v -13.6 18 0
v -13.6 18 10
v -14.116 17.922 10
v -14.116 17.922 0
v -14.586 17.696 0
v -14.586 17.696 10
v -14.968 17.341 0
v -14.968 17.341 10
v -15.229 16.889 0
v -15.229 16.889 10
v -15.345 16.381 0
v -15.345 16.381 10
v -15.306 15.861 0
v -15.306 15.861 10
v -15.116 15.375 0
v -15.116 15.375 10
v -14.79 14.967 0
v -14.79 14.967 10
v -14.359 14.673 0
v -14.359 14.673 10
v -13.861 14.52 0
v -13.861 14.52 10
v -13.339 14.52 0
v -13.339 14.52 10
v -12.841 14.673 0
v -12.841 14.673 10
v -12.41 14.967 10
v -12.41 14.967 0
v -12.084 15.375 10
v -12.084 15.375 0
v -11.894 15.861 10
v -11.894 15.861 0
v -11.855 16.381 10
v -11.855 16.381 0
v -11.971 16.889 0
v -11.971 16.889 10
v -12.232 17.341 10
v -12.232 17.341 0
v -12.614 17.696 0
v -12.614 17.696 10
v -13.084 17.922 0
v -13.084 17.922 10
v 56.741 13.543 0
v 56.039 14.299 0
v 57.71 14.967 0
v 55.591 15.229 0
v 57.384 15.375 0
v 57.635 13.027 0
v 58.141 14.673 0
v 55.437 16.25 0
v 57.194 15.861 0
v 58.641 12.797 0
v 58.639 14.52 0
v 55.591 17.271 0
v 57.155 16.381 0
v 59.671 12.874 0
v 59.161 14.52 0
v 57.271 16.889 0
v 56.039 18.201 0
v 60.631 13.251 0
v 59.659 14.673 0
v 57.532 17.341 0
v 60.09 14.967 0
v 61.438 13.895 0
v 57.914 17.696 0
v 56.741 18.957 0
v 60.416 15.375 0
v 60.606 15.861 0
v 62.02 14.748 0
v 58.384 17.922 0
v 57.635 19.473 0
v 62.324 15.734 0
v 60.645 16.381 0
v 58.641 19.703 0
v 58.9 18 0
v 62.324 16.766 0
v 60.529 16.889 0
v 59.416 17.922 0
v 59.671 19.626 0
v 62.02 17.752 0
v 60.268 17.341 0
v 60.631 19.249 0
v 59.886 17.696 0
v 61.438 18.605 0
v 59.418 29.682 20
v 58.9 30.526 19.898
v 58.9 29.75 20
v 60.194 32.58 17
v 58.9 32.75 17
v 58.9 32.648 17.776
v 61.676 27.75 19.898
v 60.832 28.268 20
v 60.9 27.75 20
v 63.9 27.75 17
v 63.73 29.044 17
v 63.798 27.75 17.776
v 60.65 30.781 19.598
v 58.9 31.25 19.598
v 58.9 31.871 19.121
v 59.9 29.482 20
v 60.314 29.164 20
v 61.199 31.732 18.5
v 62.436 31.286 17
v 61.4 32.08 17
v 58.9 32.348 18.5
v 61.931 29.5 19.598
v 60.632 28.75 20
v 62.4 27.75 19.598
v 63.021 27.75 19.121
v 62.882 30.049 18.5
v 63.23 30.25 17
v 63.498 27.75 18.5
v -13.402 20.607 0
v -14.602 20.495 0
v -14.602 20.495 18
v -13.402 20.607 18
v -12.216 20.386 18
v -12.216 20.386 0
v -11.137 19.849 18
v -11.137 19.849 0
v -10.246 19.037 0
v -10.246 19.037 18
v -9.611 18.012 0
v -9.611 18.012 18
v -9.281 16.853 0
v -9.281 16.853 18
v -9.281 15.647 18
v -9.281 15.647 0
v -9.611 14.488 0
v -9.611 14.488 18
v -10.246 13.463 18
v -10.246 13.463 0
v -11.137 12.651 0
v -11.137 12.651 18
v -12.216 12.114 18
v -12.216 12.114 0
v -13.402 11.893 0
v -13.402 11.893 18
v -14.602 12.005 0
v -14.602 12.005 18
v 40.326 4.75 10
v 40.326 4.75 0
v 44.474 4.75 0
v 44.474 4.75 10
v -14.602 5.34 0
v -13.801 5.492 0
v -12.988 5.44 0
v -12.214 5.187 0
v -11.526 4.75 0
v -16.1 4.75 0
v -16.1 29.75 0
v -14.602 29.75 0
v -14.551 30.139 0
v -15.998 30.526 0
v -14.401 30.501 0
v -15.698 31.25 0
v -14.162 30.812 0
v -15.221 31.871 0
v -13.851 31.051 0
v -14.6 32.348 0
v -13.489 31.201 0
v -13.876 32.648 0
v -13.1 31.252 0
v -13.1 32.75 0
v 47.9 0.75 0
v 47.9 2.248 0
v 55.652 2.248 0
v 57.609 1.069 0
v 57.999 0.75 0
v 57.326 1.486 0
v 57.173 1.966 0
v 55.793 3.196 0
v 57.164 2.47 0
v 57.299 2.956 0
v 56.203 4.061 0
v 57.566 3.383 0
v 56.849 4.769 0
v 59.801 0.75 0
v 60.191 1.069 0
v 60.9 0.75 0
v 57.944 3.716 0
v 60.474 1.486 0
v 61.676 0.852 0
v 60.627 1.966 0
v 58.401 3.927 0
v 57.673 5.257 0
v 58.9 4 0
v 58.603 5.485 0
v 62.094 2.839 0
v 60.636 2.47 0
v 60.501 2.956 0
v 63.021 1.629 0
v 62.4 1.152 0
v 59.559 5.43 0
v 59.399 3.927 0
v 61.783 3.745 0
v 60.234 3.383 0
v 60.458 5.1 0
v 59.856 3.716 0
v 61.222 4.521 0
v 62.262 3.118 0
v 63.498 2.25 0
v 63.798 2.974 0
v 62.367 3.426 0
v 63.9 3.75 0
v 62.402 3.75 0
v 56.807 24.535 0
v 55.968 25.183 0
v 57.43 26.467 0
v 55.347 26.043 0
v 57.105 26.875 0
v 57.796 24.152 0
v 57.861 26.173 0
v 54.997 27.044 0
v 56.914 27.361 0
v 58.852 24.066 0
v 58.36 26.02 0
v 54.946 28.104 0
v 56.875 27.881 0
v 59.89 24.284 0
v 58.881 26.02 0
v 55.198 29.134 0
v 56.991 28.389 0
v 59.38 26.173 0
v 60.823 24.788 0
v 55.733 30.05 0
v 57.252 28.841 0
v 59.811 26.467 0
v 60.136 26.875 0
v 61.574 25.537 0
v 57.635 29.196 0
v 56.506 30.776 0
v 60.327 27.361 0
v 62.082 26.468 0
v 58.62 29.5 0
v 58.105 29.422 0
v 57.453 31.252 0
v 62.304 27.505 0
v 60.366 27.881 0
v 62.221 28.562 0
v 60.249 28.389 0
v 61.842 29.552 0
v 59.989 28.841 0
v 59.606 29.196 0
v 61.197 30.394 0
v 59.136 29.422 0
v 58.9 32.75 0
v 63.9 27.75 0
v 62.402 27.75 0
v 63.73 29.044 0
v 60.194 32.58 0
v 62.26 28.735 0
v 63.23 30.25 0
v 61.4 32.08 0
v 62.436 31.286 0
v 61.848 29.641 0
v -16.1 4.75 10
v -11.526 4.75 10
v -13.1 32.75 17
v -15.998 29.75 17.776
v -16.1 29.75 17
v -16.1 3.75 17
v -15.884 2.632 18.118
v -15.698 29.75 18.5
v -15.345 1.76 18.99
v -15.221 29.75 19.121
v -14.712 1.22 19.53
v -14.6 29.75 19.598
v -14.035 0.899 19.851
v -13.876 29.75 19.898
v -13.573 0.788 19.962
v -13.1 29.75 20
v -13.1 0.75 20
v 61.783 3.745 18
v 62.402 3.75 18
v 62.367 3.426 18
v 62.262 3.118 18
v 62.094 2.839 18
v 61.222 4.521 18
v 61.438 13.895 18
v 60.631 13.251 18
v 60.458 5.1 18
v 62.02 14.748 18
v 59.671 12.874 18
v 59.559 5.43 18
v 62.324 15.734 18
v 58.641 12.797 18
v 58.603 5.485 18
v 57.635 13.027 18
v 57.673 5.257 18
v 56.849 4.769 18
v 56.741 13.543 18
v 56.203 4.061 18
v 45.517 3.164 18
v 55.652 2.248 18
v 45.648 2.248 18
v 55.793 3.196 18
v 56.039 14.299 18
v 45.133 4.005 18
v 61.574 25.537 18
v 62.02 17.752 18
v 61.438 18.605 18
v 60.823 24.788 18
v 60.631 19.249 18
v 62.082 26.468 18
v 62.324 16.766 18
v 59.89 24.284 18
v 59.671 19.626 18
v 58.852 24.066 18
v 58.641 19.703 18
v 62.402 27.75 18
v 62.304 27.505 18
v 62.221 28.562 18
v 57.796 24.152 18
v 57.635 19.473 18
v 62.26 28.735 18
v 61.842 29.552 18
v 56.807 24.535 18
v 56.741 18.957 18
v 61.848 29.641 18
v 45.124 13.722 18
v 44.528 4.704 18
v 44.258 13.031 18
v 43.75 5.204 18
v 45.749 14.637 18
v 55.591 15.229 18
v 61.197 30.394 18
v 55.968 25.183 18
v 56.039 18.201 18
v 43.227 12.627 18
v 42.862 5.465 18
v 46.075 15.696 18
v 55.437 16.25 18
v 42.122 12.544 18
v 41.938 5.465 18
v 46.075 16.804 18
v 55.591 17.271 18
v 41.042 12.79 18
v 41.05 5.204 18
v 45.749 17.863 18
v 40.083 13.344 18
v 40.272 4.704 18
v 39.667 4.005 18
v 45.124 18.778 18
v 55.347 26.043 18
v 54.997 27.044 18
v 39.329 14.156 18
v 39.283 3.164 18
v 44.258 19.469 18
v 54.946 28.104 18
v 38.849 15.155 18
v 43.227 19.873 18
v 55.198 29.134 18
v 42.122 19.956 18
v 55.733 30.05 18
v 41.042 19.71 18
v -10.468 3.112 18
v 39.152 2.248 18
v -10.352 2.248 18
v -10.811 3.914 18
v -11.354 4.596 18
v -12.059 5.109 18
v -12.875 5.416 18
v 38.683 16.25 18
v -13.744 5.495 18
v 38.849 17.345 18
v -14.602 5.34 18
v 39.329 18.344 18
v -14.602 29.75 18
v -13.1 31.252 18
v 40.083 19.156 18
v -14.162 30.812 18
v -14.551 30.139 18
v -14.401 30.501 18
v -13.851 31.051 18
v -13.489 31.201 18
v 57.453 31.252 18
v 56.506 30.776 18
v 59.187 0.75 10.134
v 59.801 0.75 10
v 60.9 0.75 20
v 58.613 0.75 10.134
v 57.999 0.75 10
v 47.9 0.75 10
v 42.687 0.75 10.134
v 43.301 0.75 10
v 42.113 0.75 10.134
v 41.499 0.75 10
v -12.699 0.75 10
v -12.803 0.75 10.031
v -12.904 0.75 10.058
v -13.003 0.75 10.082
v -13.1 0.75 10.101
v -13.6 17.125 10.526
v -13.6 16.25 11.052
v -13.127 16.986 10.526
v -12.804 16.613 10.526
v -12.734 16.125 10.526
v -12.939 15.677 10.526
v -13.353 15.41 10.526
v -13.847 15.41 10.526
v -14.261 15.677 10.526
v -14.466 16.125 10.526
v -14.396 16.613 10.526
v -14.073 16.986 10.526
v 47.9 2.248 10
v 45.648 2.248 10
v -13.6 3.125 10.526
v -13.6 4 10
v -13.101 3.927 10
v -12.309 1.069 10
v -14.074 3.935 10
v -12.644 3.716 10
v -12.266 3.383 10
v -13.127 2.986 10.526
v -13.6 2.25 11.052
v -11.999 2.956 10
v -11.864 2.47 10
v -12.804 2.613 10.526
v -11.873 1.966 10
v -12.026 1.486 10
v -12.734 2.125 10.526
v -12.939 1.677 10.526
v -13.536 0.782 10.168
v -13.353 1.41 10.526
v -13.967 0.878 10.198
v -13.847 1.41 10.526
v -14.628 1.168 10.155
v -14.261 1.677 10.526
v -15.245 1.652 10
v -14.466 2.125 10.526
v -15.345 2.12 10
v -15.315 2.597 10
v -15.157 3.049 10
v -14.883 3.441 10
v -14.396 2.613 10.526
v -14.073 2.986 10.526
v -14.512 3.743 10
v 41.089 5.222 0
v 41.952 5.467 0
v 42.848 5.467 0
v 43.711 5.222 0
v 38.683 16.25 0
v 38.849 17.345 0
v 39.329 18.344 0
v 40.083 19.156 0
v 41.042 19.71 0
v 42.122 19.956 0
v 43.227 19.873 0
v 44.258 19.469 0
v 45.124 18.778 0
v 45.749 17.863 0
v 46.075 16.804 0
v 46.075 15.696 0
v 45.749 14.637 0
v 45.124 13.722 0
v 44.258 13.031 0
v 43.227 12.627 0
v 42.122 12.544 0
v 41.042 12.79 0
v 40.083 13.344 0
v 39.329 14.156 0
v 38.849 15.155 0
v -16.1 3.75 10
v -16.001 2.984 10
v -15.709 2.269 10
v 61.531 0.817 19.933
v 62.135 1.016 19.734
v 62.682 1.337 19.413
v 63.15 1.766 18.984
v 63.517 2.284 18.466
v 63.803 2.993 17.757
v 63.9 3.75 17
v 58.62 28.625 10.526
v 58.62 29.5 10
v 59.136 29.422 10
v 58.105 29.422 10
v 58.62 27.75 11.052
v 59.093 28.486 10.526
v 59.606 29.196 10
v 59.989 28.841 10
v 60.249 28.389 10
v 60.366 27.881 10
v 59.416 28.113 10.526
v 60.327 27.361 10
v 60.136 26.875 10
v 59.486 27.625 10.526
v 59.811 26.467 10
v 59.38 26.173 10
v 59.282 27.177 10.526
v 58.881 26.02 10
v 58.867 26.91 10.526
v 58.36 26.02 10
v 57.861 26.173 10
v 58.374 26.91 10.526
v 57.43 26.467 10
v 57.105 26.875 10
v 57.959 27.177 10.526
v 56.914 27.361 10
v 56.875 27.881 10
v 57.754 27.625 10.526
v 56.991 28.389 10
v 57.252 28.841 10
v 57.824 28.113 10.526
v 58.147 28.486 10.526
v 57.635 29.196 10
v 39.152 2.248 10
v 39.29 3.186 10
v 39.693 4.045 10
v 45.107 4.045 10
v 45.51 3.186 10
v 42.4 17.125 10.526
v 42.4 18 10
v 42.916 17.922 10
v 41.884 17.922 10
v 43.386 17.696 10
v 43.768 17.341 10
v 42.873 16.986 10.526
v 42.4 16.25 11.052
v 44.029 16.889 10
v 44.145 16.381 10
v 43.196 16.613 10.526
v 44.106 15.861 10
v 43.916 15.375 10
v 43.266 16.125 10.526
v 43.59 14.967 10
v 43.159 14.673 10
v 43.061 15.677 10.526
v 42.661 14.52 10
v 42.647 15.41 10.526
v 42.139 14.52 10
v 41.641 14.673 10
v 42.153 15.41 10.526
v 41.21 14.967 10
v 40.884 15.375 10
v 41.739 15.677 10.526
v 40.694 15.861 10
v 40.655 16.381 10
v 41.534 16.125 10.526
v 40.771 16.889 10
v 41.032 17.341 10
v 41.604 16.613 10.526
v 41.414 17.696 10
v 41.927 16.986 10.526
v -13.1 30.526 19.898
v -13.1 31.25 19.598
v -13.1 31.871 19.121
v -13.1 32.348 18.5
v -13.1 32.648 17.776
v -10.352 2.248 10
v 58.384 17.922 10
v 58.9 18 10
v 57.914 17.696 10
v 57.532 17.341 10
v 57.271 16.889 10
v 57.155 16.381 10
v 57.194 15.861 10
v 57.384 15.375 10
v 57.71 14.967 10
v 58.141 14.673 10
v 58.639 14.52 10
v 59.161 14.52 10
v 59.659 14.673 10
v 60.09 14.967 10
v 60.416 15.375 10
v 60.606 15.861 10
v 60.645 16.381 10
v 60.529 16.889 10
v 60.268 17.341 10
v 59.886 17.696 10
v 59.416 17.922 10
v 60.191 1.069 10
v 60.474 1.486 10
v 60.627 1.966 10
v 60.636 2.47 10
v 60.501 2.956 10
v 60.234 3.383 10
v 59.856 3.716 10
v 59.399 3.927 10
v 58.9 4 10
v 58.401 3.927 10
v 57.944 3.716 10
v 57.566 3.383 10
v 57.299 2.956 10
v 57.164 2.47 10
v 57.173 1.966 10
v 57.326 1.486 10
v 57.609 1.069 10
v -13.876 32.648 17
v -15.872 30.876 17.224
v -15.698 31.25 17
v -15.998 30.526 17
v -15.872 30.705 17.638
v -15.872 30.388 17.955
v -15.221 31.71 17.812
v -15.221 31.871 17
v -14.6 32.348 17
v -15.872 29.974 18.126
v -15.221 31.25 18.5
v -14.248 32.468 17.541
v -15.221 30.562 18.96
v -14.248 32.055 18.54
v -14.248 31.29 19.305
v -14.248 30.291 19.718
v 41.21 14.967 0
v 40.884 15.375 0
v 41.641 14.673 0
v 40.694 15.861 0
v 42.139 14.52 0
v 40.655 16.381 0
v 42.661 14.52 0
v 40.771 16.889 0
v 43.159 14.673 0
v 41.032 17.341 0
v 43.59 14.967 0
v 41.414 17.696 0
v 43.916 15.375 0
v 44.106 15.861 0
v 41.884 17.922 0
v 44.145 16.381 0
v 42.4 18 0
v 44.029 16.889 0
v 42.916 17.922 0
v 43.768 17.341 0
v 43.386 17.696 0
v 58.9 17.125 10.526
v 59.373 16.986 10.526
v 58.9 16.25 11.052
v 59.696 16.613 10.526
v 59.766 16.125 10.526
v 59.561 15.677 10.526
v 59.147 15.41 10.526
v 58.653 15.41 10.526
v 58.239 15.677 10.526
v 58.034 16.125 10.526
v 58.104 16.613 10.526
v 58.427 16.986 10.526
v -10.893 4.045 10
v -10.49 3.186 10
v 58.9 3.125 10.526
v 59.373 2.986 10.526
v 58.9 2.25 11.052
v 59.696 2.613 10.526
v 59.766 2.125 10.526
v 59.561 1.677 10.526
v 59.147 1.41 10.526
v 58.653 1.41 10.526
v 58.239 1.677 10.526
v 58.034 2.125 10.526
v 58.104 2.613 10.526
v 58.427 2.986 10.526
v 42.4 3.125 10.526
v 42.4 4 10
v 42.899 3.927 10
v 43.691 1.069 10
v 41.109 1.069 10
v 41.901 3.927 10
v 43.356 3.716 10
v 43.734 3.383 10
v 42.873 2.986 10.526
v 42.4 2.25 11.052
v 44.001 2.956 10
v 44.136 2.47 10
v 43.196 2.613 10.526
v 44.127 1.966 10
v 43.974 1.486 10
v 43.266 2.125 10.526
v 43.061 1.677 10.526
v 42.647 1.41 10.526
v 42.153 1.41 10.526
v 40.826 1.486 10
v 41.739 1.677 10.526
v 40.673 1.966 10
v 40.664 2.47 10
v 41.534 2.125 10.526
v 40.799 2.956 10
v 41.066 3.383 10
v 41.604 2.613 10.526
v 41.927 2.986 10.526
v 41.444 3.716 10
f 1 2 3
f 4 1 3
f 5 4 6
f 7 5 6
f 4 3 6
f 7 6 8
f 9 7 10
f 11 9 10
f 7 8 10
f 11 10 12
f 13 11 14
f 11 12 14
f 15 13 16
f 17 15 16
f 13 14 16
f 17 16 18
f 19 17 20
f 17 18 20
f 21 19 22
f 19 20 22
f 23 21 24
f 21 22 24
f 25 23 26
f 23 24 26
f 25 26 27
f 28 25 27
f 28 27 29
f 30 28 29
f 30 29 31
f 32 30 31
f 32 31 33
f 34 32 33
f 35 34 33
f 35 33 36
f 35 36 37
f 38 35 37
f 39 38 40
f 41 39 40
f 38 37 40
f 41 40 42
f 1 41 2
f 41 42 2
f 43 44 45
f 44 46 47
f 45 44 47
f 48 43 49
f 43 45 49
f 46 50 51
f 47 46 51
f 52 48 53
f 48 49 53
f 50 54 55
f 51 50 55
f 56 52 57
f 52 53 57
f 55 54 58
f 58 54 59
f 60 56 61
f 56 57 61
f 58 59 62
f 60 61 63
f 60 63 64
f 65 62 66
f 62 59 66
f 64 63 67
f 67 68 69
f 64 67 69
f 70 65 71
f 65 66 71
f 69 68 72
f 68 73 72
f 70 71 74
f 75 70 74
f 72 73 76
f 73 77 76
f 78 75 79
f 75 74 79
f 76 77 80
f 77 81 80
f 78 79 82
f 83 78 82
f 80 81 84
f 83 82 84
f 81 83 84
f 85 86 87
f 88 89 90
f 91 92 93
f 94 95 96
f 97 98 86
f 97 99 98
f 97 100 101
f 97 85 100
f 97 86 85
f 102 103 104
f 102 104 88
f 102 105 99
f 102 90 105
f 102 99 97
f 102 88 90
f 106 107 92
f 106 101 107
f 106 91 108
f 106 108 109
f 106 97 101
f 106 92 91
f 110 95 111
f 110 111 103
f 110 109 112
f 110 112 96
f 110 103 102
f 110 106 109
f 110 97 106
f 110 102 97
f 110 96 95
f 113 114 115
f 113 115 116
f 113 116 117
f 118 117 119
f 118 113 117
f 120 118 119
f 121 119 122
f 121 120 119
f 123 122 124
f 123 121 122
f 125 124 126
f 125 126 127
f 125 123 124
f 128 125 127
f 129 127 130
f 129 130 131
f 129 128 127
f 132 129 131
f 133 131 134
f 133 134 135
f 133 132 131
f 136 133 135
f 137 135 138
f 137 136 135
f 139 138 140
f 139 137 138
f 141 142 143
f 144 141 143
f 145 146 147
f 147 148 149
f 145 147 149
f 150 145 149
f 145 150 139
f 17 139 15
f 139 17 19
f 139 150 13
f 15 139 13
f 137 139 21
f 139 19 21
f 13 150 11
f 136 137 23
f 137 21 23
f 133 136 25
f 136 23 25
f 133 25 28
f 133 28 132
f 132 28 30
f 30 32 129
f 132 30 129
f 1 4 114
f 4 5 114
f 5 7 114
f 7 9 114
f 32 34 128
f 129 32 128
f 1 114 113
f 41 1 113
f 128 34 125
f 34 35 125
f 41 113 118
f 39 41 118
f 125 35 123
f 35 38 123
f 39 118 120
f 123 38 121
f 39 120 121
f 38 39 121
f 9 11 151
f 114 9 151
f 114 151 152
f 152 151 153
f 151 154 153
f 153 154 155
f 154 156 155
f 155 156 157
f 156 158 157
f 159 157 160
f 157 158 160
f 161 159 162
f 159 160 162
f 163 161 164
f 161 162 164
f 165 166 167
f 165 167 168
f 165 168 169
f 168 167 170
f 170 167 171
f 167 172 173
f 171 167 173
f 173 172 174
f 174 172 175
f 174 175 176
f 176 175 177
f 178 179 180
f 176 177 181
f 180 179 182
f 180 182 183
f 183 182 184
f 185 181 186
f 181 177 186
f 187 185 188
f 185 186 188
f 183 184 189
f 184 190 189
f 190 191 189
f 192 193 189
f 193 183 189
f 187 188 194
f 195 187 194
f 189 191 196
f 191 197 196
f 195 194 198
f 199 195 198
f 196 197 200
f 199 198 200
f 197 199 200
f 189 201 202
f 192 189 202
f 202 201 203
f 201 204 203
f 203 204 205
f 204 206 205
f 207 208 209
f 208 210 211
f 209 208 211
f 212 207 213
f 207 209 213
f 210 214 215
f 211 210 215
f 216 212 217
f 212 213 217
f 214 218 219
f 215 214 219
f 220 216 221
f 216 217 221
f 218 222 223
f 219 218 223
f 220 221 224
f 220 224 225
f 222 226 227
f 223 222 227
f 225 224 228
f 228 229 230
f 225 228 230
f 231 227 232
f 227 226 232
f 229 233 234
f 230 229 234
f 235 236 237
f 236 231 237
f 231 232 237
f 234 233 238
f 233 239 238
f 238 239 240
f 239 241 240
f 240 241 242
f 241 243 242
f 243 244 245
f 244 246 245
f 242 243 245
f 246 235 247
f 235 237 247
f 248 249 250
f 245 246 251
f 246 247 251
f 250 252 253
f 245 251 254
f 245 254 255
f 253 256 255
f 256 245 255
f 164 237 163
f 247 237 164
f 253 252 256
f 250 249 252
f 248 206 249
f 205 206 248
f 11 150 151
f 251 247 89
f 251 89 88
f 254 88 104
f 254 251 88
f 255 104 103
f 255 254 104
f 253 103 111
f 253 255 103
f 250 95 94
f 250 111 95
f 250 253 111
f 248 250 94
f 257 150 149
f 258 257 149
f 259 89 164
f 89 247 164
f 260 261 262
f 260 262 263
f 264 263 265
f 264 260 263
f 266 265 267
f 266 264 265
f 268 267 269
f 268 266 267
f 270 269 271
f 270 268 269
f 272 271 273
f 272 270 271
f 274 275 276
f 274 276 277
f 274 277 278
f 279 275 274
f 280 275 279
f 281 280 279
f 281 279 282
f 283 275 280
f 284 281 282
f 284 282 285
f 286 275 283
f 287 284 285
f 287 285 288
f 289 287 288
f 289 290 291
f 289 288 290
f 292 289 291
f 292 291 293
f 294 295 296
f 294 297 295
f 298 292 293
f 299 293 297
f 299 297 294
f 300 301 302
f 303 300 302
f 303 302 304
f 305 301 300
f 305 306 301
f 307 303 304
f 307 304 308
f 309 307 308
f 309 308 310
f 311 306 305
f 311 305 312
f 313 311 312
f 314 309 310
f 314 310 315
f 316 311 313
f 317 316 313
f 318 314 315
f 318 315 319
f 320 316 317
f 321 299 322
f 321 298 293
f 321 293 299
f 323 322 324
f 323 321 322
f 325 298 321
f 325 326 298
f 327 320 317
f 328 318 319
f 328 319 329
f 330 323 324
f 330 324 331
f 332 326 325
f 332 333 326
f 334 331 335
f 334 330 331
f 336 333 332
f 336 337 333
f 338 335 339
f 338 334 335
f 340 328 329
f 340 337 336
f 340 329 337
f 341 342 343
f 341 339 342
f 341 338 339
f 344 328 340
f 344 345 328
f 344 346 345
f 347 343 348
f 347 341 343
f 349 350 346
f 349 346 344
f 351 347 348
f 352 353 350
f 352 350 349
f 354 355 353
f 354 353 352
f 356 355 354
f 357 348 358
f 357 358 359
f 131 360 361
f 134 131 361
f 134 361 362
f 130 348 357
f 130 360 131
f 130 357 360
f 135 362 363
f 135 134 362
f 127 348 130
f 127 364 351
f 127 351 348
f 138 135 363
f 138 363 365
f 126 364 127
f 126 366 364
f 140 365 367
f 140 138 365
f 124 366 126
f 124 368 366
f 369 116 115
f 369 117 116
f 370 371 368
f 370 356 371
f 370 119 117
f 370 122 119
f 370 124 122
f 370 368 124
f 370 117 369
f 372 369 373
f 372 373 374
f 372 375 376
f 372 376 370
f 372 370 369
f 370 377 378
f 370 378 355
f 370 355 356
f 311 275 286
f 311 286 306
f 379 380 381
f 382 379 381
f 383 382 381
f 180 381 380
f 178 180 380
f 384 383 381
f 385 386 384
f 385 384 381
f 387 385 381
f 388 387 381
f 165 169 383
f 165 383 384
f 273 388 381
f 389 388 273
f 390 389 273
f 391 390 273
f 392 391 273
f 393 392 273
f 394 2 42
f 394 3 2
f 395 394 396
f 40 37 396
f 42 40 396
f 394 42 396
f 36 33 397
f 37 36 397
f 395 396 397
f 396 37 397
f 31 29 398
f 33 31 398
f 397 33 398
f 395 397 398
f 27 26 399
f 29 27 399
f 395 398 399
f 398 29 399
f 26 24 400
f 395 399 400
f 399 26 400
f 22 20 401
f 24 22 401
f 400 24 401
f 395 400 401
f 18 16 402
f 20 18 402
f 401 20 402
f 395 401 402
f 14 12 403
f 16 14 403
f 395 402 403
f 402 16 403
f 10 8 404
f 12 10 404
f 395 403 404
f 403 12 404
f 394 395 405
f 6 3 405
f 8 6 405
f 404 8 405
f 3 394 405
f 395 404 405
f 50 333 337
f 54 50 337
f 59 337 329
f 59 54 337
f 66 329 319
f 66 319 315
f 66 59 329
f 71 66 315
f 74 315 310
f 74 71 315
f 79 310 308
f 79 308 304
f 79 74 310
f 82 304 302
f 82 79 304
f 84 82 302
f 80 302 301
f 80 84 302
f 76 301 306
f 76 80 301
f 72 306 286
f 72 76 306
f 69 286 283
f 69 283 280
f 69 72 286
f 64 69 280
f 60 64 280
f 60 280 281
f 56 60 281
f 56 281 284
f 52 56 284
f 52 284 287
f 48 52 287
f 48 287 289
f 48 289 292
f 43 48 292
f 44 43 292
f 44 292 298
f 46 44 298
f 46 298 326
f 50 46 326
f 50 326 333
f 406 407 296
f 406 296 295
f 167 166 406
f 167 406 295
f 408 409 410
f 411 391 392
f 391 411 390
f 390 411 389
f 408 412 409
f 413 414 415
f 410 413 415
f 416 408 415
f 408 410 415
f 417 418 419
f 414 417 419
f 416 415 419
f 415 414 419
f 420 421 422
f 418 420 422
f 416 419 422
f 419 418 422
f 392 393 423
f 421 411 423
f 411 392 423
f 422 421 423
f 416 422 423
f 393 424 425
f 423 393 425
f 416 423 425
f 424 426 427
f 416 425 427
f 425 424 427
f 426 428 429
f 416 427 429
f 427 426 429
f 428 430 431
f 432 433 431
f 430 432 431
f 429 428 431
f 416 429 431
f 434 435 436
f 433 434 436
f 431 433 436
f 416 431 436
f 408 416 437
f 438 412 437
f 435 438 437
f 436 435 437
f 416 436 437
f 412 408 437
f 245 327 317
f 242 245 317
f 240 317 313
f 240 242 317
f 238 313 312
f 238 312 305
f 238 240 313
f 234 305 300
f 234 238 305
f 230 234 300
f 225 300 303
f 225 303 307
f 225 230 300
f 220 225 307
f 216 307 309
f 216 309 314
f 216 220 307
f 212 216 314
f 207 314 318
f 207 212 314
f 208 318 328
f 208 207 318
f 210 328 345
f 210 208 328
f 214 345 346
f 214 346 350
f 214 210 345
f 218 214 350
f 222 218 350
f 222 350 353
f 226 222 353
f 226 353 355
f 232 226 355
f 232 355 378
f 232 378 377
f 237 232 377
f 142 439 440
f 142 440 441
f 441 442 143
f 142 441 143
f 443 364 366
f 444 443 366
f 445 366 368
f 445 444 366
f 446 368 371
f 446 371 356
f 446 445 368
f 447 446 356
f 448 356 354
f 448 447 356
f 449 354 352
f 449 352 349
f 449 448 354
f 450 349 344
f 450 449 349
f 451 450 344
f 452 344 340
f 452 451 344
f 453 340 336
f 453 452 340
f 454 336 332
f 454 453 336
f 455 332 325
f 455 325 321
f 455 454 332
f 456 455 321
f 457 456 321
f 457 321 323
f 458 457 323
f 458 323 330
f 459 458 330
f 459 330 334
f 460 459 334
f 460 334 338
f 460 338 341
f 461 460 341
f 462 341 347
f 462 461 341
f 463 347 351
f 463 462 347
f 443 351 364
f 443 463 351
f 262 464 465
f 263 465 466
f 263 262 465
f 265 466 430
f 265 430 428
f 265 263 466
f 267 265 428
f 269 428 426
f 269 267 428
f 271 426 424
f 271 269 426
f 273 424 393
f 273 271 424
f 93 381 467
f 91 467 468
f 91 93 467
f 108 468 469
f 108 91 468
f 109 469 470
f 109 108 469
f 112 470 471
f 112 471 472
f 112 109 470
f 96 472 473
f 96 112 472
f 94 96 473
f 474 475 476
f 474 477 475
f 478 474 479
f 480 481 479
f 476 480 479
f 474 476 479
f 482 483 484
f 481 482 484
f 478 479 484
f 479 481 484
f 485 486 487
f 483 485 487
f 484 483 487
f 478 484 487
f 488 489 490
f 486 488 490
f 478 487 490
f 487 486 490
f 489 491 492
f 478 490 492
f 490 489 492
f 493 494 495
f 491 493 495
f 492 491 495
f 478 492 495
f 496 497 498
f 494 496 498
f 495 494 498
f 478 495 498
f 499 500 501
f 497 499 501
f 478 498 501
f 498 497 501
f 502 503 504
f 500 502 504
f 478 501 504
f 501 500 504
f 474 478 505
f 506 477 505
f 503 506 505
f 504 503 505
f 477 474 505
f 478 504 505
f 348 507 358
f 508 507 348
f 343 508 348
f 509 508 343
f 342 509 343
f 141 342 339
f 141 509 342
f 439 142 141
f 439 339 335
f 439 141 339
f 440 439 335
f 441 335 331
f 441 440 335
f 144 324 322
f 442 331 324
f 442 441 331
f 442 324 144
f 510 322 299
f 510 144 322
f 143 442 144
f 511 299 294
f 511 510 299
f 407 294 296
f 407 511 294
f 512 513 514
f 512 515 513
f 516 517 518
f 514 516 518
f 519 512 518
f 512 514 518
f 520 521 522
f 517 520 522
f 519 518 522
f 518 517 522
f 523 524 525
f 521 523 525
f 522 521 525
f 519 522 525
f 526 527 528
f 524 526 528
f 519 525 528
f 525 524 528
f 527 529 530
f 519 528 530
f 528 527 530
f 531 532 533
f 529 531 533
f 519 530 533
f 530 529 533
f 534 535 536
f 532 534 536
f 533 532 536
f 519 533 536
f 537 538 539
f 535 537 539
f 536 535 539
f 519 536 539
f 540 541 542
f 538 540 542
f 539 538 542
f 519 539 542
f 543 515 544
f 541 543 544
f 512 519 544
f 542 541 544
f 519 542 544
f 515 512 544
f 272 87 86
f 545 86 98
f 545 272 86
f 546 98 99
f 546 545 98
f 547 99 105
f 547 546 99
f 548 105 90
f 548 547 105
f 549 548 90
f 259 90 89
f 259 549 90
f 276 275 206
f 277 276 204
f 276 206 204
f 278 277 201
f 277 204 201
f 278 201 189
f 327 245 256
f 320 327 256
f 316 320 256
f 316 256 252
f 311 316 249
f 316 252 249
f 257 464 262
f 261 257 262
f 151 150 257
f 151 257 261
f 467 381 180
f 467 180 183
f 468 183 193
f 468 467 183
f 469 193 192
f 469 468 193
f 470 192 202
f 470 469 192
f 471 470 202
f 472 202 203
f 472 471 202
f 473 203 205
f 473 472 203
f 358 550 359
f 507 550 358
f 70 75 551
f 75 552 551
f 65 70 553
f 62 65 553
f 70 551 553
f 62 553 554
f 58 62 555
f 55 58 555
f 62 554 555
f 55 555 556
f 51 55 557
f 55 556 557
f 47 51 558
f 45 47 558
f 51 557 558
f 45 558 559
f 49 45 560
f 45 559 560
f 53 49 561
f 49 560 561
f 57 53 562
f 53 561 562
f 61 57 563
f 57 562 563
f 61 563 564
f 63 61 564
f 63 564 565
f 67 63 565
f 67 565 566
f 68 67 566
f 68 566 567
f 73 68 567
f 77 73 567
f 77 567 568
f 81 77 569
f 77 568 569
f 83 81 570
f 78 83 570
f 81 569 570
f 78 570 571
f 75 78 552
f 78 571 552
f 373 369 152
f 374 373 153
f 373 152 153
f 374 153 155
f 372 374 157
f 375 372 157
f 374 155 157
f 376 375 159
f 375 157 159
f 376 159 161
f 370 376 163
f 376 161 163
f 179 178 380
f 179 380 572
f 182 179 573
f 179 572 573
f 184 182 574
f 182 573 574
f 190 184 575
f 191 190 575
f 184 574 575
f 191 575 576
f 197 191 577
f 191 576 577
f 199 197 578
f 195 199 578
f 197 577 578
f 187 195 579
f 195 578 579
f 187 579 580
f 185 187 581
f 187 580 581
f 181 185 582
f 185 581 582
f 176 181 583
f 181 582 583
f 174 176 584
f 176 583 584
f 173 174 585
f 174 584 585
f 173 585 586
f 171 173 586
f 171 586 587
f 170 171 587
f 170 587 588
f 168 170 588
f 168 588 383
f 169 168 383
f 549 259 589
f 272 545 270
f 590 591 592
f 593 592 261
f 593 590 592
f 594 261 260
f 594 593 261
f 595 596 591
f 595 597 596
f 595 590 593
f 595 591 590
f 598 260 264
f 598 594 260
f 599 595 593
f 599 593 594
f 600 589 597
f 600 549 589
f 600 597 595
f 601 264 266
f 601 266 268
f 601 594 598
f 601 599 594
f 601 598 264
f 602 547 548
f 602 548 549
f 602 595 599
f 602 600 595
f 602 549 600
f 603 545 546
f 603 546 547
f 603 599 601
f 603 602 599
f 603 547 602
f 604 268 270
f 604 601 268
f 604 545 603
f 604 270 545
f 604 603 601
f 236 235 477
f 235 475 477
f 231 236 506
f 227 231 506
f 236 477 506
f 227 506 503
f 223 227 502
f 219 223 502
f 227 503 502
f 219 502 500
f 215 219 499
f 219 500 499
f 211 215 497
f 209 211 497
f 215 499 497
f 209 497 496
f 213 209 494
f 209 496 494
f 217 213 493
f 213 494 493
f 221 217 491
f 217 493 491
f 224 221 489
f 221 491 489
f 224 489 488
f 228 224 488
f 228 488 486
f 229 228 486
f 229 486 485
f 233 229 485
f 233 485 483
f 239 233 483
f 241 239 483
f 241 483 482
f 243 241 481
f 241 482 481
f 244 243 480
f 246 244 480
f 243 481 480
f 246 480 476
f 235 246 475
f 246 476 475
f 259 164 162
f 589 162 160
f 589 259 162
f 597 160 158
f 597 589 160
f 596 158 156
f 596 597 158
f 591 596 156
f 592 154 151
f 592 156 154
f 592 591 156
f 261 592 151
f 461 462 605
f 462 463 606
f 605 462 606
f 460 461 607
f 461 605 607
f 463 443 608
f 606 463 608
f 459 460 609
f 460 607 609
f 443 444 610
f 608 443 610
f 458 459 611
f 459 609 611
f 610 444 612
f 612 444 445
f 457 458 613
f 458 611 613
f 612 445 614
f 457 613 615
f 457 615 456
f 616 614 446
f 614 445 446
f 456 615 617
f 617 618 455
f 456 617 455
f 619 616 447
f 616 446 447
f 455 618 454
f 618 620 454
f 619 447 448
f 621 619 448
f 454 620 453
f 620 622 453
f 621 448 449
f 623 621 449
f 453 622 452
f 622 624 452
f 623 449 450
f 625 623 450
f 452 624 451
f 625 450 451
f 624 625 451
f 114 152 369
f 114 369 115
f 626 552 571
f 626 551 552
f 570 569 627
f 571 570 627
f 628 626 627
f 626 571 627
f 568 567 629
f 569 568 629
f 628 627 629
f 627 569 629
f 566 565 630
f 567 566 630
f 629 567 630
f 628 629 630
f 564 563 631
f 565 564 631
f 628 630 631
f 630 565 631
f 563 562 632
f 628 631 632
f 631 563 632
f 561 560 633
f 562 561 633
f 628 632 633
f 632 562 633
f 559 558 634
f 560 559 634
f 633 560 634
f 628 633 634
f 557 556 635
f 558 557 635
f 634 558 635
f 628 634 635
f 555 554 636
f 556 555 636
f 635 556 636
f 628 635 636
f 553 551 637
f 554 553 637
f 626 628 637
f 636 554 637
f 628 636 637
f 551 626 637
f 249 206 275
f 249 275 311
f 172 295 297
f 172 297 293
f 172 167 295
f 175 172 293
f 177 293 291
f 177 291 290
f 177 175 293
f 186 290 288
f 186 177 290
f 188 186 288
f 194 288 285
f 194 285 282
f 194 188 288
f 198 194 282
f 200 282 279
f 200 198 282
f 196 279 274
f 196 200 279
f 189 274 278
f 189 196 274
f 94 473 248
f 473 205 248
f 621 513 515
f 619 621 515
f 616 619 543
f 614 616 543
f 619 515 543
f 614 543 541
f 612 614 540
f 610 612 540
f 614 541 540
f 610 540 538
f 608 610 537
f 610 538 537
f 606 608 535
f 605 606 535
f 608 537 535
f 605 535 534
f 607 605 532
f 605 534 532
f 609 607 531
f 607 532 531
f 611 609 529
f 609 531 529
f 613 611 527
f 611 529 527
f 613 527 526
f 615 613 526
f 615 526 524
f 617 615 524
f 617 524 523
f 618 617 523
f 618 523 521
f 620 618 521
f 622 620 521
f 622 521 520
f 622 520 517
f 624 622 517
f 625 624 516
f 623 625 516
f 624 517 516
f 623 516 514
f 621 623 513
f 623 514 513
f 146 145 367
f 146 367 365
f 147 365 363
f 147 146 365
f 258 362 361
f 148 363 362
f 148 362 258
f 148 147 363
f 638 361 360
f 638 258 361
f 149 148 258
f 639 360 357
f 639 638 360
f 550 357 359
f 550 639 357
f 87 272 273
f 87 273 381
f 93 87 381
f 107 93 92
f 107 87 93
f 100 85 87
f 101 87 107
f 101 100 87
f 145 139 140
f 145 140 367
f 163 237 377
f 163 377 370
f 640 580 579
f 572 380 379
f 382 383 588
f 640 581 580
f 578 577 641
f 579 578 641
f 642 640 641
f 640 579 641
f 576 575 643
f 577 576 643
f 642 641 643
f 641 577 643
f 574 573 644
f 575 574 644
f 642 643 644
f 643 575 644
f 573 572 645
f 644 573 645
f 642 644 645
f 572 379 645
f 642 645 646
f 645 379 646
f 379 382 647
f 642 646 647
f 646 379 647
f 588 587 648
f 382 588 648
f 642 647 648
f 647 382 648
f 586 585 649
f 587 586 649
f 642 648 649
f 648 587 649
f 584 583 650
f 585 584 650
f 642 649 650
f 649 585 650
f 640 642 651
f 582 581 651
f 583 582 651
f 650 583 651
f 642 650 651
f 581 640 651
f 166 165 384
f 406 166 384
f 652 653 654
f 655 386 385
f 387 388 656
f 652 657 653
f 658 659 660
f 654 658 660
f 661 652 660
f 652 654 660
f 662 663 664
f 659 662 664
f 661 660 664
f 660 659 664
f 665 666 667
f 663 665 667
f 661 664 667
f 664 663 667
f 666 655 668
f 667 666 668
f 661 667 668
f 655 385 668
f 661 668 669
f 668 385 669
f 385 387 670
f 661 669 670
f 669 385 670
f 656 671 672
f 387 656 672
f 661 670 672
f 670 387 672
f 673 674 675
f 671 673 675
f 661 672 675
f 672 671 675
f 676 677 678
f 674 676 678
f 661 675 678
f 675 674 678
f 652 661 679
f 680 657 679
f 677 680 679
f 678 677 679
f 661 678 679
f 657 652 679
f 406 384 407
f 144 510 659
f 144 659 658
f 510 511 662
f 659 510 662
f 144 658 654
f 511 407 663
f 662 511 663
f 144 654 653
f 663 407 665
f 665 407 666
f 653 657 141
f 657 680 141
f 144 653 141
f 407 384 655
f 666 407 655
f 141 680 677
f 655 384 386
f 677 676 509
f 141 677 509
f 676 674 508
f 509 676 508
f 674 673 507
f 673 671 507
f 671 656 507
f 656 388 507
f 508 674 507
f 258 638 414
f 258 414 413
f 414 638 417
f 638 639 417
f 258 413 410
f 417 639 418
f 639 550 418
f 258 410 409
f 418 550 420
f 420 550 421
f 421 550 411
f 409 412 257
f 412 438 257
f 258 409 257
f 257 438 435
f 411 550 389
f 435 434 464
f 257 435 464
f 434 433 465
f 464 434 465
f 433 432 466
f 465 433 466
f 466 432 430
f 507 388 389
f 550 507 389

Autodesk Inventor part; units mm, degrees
ref_plane "YZ Plane" through (0, 0, 0) normal (1, 0, 0) x (0, 1, 0)
ref_plane "XZ Plane" through (0, 0, 0) normal (0, 1, 0) x (-1, 0, 0)
ref_plane "XY Plane" through (0, 0, 0) normal (0, 0, 1) x (1, 0, 0)
ref_plane "Arbeitsebene1" through (0, 0, 0) normal (0, 0, 1) x (1, 0, 0)
sketch "Skizze1" plane through (0, 0, 0) normal (0, 0, 1) x (1, 0, 0)
  line L0 (37.9, 26.5) -> (37.9, 13.35) projected
  line L1 (37.9, 13.35) -> (53.9, 13.35) projected
  line L2 (53.9, 13.35) -> (53.9, 13.85) projected
  line L3 (53.9, 13.85) -> (63.9, 13.85) projected
  line L4 (63.9, 13.85) -> (63.9, 27.75) projected
  arc A0 (63.9, 27.75) -> (58.9, 32.75) centre (58.9, 27.75) ccw projected
  line L5 (58.9, 32.75) -> (-58.9, 32.75) projected
  arc A1 (-58.9, 32.75) -> (-63.9, 27.75) centre (-58.9, 27.75) ccw projected
  line L6 (-63.9, 27.75) -> (-63.9, 19.25) projected
  line L7 (-63.9, 19.25) -> (-58.9, 19.25) projected
  line L8 (-58.9, 19.25) -> (-58.9, 19.75) projected
  line L9 (-58.9, 19.75) -> (-38.9, 19.75) projected
  line L10 (-38.9, 19.75) -> (-38.9, 13.85) projected
  line L11 (-38.9, 13.85) -> (-28.9, 13.85) projected
  line L12 (-28.9, 13.85) -> (-28.9, 13.35) projected
  line L13 (-28.9, 13.35) -> (-8.6, 13.35) projected
  line L14 (-8.6, 13.35) -> (-8.6, 26.5) projected
  line L15 (-8.6, 26.5) -> (37.9, 26.5) projected
  circle A2 centre (58.6204, 27.75) radius 1.4 projected
  circle A3 centre (-59.1796, 27.75) radius 1.4 projected
  circle A4 centre (-13.6, 16.25) radius 1.4 projected
  circle A5 centre (-33.6, 16.25) radius 1.4 projected
  circle A6 centre (58.9, 16.25) radius 1.4 projected
  circle A7 centre (42.4, 16.25) radius 1.4 projected
  line L16 (-8.6, -11.9682) -> (-10.6, -13.9682) projected
  line L17 (-8.6, -11.9682) -> (-8.6, 5.15) projected
  line L18 (-8.6, 5.15) -> (-28.9, 5.15) projected
  line L19 (-28.9, 5.15) -> (-28.9, 4.65) projected
  line L20 (-28.9, 4.65) -> (-38.9, 4.65) projected
  line L21 (-38.9, 4.65) -> (-38.9, -1.25) projected
  line L22 (-38.9, -1.25) -> (-58.9, -1.25) projected
  line L23 (-58.9, -1.25) -> (-58.9, -0.75) projected
  line L24 (-58.9, -0.75) -> (-63.9, -0.75) projected
  line L25 (-63.9, -0.75) -> (-63.9, -16.5797) projected
  arc A8 (-49.9, -11.2196) -> (-63.9, -16.5797) centre (-50.2702, -31.2162) ccw projected
  line L26 (-49.9, -11.2196) -> (-49.9, -13.9682) projected
  line L27 (-49.9, -13.9682) -> (-10.6, -13.9682) projected
  circle A9 centre (-13.3796, -11.2637) radius 1.4 projected
  circle A10 centre (-33.6, 2.25) radius 1.4 projected
  circle A11 centre (-13.6, 2.25) radius 1.4 projected
  circle A12 centre (58.6204, -47.75) radius 1.4 projected
  circle A13 centre (58.9, 2.25) radius 1.4 projected
  circle A14 centre (42.4, 2.25) radius 1.4 projected
  circle A15 centre (42.4, -11.2637) radius 1.4 projected
  circle A16 centre (42.4, -31.25) radius 1.4 projected
  line L28 (63.9, 4.65) -> (53.9, 4.65) projected
  line L29 (53.9, 4.65) -> (53.9, 5.15) projected
  line L30 (53.9, 5.15) -> (37.9, 5.15) projected
  line L31 (37.9, 5.15) -> (37.9, -41.35) projected
  line L32 (37.9, -41.35) -> (-33.0276, -41.35) projected
  arc A17 (-59.1255, -49.149) -> (-33.0276, -41.35) centre (-50.2702, -31.2162) ccw projected
  arc A18 (-60.3777, -48.4742) -> (-59.1255, -49.149) centre (-59.1796, -47.75) ccw projected
  arc A19 (-63.9, -45.8527) -> (-60.3777, -48.4742) centre (-50.2702, -31.2162) ccw projected
  line L33 (-63.9, -45.8527) -> (-63.9, -47.75) projected
  arc A20 (-63.9, -47.75) -> (-58.9, -52.75) centre (-58.9, -47.75) ccw projected
  line L34 (-58.9, -52.75) -> (58.9, -52.75) projected
  arc A21 (58.9, -52.75) -> (63.9, -47.75) centre (58.9, -47.75) ccw projected
  line L35 (63.9, -47.75) -> (63.9, 4.65) projected
  line L36 (-16.1, 32.75) -> (63.9, 32.75)
  line L37 (63.9, 32.75) -> (63.9, 0.75)
  line L38 (63.9, 0.75) -> (-16.1, 0.75)
  line L39 (-16.1, 0.75) -> (-16.1, 32.75)
  point P0 (0, 0)
  dimension "d0" = 80
  dimension "d1" = 0
  dimension "d2" = 32
extrude "Extrusion1" add sketch "Skizze1" along normal blind 20 contours L15 L14 L13 L39 L5 A0 L4 L3 L2 L1 L0 | L0 L1 L2 L3 L37 L28 L29 L30 L31 L38 L17 L18 L39 L13 L14 L15 | L18 L17 L38 L39 | L35 L38 L31 L30 L29 L28 | A2 | A4 | A6 | A7 | A11 | A13 | A14
fillet "Rundung1" radius 3 7 edges at (62.4355, 31.2855, 20) (63.9, 20.8, 20) (21.4, 32.75, 20) (-16.1, 16.75, 20) (-16.1, 0.75, 10) (-16.1, 32.75, 10) (63.9, 0.75, 10)
sketch "Skizze2" plane through (0, 0, 0) normal (0, 0, -1) x (-1, 0, 0)
  arc A0 (13.1, 0.75) -> (16.1, 3.75) centre (13.1, 3.75) ccw projected
  line L0 (16.1, 29.75) -> (16.1, 3.75) projected
  arc A1 (16.1, 29.75) -> (13.1, 32.75) centre (13.1, 29.75) ccw projected
  line L1 (-58.9, 32.75) -> (13.1, 32.75) projected
  arc A2 (-58.9, 32.75) -> (-63.9, 27.75) centre (-58.9, 27.75) ccw projected
  line L2 (-63.9, 3.75) -> (-63.9, 27.75) projected
  arc A3 (-63.9, 3.75) -> (-60.9, 0.75) centre (-60.9, 3.75) ccw projected
  line L3 (13.1, 0.75) -> (-60.9, 0.75) projected
  line L4 (63.9, -47.75) -> (63.9, 27.75) projected
  arc A4 (63.9, 27.75) -> (58.9, 32.75) centre (58.9, 27.75) ccw projected
  line L5 (58.9, 32.75) -> (-58.9, 32.75) projected
  arc A5 (-58.9, 32.75) -> (-63.9, 27.75) centre (-58.9, 27.75) ccw projected
  line L6 (-63.9, 27.75) -> (-63.9, -47.75) projected
  arc A6 (-63.9, -47.75) -> (-58.9, -52.75) centre (-58.9, -47.75) ccw projected
  line L7 (-58.9, -52.75) -> (58.9, -52.75) projected
  arc A7 (58.9, -52.75) -> (63.9, -47.75) centre (58.9, -47.75) ccw projected
  circle A8 centre (-42.4, -31.25) radius 1.4 projected
  circle A9 centre (13.3796, -11.2637) radius 1.4 projected
  circle A10 centre (-42.4, 16.25) radius 1.4 projected
  circle A11 centre (-58.9, 16.25) radius 1.4 projected
  circle A12 centre (-42.4, 2.25) radius 1.4 projected
  circle A13 centre (33.6, 16.25) radius 1.4 projected
  circle A14 centre (13.6, 2.25) radius 1.4 projected
  circle A15 centre (13.6, 16.25) radius 1.4 projected
  circle A16 centre (-58.9, 2.25) radius 1.4 projected
  circle A17 centre (33.6, 2.25) radius 1.4 projected
  circle A18 centre (-42.4, -11.2637) radius 1.4 projected
  circle A19 centre (-58.6204, -47.75) radius 1.4 projected
  circle A20 centre (59.1796, 27.75) radius 1.4 projected
  circle A21 centre (59.1796, -47.75) radius 1.4 projected
  circle A22 centre (-58.6204, 27.75) radius 1.4 projected
  line L8 (-37.9, -41.35) -> (-37.9, 26.5) projected
  line L9 (-37.9, 26.5) -> (8.6, 26.5) projected
  line L10 (8.6, 26.5) -> (8.6, -11.9682) projected
  line L11 (10.6, -13.9682) -> (8.6, -11.9682) projected
  line L12 (10.6, -13.9682) -> (49.9, -13.9682) projected
  line L13 (49.9, -13.9682) -> (49.9, -41.35) projected
  line L14 (49.9, -41.35) -> (-37.9, -41.35) projected
  line L15 (58.9, -0.75) -> (58.9, -1.25) projected
  line L16 (58.9, -1.25) -> (38.9, -1.25) projected
  line L17 (38.9, -1.25) -> (38.9, 19.75) projected
  line L18 (38.9, 19.75) -> (58.9, 19.75) projected
  line L19 (58.9, 19.75) -> (58.9, 19.25) projected
  line L20 (58.9, 19.25) -> (55.9, 19.25) projected
  line L21 (55.9, -0.75) -> (55.9, 19.25) projected
  line L22 (58.9, -0.75) -> (55.9, -0.75) projected
  point P0 (0, 0)
hole "Bohrung1" at (42.4, 2.25, 0) at (58.9, 2.25, 0) at (58.9, 16.25, 0) at (42.4, 16.25, 0) at (58.6204, 27.75, 0) at (-13.6, 16.25, 0) at (-13.6, 2.25, 0) direction (0, 0, 1) diameter 3.5 depth 10 tip angle 118
sketch "Skizze3" plane through (0, 0, 0) normal (0, 0, -1) x (-1, 0, 0)
  arc A0 (15.2448, 1.6524) -> (16.1, 3.75) centre (13.1, 3.75) ccw projected
  line L0 (16.1, 29.75) -> (16.1, 3.75) projected
  arc A1 (16.1, 29.75) -> (13.1, 32.75) centre (13.1, 29.75) ccw projected
  line L1 (-58.9, 32.75) -> (13.1, 32.75) projected
  arc A2 (-58.9, 32.75) -> (-63.9, 27.75) centre (-58.9, 27.75) ccw projected
  line L2 (-63.9, 3.75) -> (-63.9, 27.75) projected
  arc A3 (-63.9, 3.75) -> (-60.9, 0.75) centre (-60.9, 3.75) ccw projected
  line L3 (-43.3014, 0.75) -> (-57.9986, 0.75) projected
  arc A4 (-58.9, 31.2519) -> (-62.4019, 27.75) centre (-58.9, 27.75) ccw
  line L4 (-58.9, 31.2519) -> (13.1, 31.2519)
  arc A5 (14.6019, 29.75) -> (13.1, 31.2519) centre (13.1, 29.75) ccw
  line L5 (14.6019, 29.75) -> (14.6019, 5.3398)
  arc A6 (14.6019, 5.3398) -> (10.3519, 2.2481) centre (13.6, 2.25) ccw
  line L6 (10.3519, 2.2481) -> (-39.1519, 2.2481)
  arc A7 (-39.1519, 2.2481) -> (-45.6481, 2.2481) centre (-42.4, 2.25) ccw
  line L7 (-45.6481, 2.2481) -> (-55.6519, 2.2481)
  arc A8 (-55.6519, 2.2481) -> (-62.0942, 2.8393) centre (-58.9, 2.25) ccw
  arc A9 (-62.4019, 3.75) -> (-62.0942, 2.8393) centre (-60.9, 3.75) ccw
  line L8 (-62.4019, 3.75) -> (-62.4019, 27.75)
  circle A10 centre (-58.9, 16.25) radius 3.4626
  circle A11 centre (-58.6204, 27.75) radius 3.6913
  circle A12 centre (-42.4, 16.25) radius 3.7166
  circle A13 centre (13.6, 16.25) radius 4.3613
  arc A14 (15.2448, 1.6524) -> (12.6986, 0.75) centre (13.6, 2.25) ccw projected
  line L9 (-59.8014, 0.75) -> (-60.9, 0.75) projected
  arc A15 (-57.9986, 0.75) -> (-59.8014, 0.75) centre (-58.9, 2.25) ccw projected
  arc A16 (-41.4986, 0.75) -> (-43.3014, 0.75) centre (-42.4, 2.25) ccw projected
  line L10 (12.6986, 0.75) -> (-41.4986, 0.75) projected
  point P0 (0, 0)
  point P1 (-57.4529, 31.2519)
  point P2 (-61.1978, 30.3926)
  point P3 (-61.7336, 4.9993)
  point P4 (14.6019, 12.0053)
  point P5 (14.6019, 20.4947)
extrude "Extrusion2" cut sketch "Skizze3" against normal blind 18 contours L5 A6 L6 A7 L7 A8 A9 L8 A4 A11 L4 A5 A13
sketch "Skizze4" plane through (-13.1, 0.75, 20) normal (0, -1, 0) x (1, 0, 0)
  circle A0 centre (31.7066, -26.8441) radius 6 projected
  line L0 (45.2066, -35.8441) -> (18.2066, -35.8441)
  line L1 (18.2066, -35.8441) -> (18.2066, -17.8441)
  line L2 (18.2066, -17.8441) -> (45.2066, -17.8441)
  line L3 (45.2066, -17.8441) -> (45.2066, -35.8441)
  line L4 (45.2066, -35.8441) -> (18.2066, -17.8441) construction
  line L5 (18.2066, -35.8441) -> (45.2066, -17.8441) construction
  point P0 (13.1, -20)
  dimension "d15" = 27
  dimension "d16" = 18
extrude "Extrusion3" cut sketch "Skizze4" against normal blind 18 contours A0 | L0 L1 L2 L3
sketch "Sketch5" plane through (-13.1, 0.75, 20) normal (0, -1, 0) x (1, 0, 0)
  line L0 (-5, -20) -> (61, -20)
  line L1 (61, -20) -> (61, -10)
  line L2 (61, -10) -> (-5, -10)
  line L3 (-5, -10) -> (-5, -20)
  point P0 (13.1, -20)
extrude "Extrusion4" cut sketch "Sketch5" against normal blind 4
properties part number "10_Wellplate_base_Lasercover"
